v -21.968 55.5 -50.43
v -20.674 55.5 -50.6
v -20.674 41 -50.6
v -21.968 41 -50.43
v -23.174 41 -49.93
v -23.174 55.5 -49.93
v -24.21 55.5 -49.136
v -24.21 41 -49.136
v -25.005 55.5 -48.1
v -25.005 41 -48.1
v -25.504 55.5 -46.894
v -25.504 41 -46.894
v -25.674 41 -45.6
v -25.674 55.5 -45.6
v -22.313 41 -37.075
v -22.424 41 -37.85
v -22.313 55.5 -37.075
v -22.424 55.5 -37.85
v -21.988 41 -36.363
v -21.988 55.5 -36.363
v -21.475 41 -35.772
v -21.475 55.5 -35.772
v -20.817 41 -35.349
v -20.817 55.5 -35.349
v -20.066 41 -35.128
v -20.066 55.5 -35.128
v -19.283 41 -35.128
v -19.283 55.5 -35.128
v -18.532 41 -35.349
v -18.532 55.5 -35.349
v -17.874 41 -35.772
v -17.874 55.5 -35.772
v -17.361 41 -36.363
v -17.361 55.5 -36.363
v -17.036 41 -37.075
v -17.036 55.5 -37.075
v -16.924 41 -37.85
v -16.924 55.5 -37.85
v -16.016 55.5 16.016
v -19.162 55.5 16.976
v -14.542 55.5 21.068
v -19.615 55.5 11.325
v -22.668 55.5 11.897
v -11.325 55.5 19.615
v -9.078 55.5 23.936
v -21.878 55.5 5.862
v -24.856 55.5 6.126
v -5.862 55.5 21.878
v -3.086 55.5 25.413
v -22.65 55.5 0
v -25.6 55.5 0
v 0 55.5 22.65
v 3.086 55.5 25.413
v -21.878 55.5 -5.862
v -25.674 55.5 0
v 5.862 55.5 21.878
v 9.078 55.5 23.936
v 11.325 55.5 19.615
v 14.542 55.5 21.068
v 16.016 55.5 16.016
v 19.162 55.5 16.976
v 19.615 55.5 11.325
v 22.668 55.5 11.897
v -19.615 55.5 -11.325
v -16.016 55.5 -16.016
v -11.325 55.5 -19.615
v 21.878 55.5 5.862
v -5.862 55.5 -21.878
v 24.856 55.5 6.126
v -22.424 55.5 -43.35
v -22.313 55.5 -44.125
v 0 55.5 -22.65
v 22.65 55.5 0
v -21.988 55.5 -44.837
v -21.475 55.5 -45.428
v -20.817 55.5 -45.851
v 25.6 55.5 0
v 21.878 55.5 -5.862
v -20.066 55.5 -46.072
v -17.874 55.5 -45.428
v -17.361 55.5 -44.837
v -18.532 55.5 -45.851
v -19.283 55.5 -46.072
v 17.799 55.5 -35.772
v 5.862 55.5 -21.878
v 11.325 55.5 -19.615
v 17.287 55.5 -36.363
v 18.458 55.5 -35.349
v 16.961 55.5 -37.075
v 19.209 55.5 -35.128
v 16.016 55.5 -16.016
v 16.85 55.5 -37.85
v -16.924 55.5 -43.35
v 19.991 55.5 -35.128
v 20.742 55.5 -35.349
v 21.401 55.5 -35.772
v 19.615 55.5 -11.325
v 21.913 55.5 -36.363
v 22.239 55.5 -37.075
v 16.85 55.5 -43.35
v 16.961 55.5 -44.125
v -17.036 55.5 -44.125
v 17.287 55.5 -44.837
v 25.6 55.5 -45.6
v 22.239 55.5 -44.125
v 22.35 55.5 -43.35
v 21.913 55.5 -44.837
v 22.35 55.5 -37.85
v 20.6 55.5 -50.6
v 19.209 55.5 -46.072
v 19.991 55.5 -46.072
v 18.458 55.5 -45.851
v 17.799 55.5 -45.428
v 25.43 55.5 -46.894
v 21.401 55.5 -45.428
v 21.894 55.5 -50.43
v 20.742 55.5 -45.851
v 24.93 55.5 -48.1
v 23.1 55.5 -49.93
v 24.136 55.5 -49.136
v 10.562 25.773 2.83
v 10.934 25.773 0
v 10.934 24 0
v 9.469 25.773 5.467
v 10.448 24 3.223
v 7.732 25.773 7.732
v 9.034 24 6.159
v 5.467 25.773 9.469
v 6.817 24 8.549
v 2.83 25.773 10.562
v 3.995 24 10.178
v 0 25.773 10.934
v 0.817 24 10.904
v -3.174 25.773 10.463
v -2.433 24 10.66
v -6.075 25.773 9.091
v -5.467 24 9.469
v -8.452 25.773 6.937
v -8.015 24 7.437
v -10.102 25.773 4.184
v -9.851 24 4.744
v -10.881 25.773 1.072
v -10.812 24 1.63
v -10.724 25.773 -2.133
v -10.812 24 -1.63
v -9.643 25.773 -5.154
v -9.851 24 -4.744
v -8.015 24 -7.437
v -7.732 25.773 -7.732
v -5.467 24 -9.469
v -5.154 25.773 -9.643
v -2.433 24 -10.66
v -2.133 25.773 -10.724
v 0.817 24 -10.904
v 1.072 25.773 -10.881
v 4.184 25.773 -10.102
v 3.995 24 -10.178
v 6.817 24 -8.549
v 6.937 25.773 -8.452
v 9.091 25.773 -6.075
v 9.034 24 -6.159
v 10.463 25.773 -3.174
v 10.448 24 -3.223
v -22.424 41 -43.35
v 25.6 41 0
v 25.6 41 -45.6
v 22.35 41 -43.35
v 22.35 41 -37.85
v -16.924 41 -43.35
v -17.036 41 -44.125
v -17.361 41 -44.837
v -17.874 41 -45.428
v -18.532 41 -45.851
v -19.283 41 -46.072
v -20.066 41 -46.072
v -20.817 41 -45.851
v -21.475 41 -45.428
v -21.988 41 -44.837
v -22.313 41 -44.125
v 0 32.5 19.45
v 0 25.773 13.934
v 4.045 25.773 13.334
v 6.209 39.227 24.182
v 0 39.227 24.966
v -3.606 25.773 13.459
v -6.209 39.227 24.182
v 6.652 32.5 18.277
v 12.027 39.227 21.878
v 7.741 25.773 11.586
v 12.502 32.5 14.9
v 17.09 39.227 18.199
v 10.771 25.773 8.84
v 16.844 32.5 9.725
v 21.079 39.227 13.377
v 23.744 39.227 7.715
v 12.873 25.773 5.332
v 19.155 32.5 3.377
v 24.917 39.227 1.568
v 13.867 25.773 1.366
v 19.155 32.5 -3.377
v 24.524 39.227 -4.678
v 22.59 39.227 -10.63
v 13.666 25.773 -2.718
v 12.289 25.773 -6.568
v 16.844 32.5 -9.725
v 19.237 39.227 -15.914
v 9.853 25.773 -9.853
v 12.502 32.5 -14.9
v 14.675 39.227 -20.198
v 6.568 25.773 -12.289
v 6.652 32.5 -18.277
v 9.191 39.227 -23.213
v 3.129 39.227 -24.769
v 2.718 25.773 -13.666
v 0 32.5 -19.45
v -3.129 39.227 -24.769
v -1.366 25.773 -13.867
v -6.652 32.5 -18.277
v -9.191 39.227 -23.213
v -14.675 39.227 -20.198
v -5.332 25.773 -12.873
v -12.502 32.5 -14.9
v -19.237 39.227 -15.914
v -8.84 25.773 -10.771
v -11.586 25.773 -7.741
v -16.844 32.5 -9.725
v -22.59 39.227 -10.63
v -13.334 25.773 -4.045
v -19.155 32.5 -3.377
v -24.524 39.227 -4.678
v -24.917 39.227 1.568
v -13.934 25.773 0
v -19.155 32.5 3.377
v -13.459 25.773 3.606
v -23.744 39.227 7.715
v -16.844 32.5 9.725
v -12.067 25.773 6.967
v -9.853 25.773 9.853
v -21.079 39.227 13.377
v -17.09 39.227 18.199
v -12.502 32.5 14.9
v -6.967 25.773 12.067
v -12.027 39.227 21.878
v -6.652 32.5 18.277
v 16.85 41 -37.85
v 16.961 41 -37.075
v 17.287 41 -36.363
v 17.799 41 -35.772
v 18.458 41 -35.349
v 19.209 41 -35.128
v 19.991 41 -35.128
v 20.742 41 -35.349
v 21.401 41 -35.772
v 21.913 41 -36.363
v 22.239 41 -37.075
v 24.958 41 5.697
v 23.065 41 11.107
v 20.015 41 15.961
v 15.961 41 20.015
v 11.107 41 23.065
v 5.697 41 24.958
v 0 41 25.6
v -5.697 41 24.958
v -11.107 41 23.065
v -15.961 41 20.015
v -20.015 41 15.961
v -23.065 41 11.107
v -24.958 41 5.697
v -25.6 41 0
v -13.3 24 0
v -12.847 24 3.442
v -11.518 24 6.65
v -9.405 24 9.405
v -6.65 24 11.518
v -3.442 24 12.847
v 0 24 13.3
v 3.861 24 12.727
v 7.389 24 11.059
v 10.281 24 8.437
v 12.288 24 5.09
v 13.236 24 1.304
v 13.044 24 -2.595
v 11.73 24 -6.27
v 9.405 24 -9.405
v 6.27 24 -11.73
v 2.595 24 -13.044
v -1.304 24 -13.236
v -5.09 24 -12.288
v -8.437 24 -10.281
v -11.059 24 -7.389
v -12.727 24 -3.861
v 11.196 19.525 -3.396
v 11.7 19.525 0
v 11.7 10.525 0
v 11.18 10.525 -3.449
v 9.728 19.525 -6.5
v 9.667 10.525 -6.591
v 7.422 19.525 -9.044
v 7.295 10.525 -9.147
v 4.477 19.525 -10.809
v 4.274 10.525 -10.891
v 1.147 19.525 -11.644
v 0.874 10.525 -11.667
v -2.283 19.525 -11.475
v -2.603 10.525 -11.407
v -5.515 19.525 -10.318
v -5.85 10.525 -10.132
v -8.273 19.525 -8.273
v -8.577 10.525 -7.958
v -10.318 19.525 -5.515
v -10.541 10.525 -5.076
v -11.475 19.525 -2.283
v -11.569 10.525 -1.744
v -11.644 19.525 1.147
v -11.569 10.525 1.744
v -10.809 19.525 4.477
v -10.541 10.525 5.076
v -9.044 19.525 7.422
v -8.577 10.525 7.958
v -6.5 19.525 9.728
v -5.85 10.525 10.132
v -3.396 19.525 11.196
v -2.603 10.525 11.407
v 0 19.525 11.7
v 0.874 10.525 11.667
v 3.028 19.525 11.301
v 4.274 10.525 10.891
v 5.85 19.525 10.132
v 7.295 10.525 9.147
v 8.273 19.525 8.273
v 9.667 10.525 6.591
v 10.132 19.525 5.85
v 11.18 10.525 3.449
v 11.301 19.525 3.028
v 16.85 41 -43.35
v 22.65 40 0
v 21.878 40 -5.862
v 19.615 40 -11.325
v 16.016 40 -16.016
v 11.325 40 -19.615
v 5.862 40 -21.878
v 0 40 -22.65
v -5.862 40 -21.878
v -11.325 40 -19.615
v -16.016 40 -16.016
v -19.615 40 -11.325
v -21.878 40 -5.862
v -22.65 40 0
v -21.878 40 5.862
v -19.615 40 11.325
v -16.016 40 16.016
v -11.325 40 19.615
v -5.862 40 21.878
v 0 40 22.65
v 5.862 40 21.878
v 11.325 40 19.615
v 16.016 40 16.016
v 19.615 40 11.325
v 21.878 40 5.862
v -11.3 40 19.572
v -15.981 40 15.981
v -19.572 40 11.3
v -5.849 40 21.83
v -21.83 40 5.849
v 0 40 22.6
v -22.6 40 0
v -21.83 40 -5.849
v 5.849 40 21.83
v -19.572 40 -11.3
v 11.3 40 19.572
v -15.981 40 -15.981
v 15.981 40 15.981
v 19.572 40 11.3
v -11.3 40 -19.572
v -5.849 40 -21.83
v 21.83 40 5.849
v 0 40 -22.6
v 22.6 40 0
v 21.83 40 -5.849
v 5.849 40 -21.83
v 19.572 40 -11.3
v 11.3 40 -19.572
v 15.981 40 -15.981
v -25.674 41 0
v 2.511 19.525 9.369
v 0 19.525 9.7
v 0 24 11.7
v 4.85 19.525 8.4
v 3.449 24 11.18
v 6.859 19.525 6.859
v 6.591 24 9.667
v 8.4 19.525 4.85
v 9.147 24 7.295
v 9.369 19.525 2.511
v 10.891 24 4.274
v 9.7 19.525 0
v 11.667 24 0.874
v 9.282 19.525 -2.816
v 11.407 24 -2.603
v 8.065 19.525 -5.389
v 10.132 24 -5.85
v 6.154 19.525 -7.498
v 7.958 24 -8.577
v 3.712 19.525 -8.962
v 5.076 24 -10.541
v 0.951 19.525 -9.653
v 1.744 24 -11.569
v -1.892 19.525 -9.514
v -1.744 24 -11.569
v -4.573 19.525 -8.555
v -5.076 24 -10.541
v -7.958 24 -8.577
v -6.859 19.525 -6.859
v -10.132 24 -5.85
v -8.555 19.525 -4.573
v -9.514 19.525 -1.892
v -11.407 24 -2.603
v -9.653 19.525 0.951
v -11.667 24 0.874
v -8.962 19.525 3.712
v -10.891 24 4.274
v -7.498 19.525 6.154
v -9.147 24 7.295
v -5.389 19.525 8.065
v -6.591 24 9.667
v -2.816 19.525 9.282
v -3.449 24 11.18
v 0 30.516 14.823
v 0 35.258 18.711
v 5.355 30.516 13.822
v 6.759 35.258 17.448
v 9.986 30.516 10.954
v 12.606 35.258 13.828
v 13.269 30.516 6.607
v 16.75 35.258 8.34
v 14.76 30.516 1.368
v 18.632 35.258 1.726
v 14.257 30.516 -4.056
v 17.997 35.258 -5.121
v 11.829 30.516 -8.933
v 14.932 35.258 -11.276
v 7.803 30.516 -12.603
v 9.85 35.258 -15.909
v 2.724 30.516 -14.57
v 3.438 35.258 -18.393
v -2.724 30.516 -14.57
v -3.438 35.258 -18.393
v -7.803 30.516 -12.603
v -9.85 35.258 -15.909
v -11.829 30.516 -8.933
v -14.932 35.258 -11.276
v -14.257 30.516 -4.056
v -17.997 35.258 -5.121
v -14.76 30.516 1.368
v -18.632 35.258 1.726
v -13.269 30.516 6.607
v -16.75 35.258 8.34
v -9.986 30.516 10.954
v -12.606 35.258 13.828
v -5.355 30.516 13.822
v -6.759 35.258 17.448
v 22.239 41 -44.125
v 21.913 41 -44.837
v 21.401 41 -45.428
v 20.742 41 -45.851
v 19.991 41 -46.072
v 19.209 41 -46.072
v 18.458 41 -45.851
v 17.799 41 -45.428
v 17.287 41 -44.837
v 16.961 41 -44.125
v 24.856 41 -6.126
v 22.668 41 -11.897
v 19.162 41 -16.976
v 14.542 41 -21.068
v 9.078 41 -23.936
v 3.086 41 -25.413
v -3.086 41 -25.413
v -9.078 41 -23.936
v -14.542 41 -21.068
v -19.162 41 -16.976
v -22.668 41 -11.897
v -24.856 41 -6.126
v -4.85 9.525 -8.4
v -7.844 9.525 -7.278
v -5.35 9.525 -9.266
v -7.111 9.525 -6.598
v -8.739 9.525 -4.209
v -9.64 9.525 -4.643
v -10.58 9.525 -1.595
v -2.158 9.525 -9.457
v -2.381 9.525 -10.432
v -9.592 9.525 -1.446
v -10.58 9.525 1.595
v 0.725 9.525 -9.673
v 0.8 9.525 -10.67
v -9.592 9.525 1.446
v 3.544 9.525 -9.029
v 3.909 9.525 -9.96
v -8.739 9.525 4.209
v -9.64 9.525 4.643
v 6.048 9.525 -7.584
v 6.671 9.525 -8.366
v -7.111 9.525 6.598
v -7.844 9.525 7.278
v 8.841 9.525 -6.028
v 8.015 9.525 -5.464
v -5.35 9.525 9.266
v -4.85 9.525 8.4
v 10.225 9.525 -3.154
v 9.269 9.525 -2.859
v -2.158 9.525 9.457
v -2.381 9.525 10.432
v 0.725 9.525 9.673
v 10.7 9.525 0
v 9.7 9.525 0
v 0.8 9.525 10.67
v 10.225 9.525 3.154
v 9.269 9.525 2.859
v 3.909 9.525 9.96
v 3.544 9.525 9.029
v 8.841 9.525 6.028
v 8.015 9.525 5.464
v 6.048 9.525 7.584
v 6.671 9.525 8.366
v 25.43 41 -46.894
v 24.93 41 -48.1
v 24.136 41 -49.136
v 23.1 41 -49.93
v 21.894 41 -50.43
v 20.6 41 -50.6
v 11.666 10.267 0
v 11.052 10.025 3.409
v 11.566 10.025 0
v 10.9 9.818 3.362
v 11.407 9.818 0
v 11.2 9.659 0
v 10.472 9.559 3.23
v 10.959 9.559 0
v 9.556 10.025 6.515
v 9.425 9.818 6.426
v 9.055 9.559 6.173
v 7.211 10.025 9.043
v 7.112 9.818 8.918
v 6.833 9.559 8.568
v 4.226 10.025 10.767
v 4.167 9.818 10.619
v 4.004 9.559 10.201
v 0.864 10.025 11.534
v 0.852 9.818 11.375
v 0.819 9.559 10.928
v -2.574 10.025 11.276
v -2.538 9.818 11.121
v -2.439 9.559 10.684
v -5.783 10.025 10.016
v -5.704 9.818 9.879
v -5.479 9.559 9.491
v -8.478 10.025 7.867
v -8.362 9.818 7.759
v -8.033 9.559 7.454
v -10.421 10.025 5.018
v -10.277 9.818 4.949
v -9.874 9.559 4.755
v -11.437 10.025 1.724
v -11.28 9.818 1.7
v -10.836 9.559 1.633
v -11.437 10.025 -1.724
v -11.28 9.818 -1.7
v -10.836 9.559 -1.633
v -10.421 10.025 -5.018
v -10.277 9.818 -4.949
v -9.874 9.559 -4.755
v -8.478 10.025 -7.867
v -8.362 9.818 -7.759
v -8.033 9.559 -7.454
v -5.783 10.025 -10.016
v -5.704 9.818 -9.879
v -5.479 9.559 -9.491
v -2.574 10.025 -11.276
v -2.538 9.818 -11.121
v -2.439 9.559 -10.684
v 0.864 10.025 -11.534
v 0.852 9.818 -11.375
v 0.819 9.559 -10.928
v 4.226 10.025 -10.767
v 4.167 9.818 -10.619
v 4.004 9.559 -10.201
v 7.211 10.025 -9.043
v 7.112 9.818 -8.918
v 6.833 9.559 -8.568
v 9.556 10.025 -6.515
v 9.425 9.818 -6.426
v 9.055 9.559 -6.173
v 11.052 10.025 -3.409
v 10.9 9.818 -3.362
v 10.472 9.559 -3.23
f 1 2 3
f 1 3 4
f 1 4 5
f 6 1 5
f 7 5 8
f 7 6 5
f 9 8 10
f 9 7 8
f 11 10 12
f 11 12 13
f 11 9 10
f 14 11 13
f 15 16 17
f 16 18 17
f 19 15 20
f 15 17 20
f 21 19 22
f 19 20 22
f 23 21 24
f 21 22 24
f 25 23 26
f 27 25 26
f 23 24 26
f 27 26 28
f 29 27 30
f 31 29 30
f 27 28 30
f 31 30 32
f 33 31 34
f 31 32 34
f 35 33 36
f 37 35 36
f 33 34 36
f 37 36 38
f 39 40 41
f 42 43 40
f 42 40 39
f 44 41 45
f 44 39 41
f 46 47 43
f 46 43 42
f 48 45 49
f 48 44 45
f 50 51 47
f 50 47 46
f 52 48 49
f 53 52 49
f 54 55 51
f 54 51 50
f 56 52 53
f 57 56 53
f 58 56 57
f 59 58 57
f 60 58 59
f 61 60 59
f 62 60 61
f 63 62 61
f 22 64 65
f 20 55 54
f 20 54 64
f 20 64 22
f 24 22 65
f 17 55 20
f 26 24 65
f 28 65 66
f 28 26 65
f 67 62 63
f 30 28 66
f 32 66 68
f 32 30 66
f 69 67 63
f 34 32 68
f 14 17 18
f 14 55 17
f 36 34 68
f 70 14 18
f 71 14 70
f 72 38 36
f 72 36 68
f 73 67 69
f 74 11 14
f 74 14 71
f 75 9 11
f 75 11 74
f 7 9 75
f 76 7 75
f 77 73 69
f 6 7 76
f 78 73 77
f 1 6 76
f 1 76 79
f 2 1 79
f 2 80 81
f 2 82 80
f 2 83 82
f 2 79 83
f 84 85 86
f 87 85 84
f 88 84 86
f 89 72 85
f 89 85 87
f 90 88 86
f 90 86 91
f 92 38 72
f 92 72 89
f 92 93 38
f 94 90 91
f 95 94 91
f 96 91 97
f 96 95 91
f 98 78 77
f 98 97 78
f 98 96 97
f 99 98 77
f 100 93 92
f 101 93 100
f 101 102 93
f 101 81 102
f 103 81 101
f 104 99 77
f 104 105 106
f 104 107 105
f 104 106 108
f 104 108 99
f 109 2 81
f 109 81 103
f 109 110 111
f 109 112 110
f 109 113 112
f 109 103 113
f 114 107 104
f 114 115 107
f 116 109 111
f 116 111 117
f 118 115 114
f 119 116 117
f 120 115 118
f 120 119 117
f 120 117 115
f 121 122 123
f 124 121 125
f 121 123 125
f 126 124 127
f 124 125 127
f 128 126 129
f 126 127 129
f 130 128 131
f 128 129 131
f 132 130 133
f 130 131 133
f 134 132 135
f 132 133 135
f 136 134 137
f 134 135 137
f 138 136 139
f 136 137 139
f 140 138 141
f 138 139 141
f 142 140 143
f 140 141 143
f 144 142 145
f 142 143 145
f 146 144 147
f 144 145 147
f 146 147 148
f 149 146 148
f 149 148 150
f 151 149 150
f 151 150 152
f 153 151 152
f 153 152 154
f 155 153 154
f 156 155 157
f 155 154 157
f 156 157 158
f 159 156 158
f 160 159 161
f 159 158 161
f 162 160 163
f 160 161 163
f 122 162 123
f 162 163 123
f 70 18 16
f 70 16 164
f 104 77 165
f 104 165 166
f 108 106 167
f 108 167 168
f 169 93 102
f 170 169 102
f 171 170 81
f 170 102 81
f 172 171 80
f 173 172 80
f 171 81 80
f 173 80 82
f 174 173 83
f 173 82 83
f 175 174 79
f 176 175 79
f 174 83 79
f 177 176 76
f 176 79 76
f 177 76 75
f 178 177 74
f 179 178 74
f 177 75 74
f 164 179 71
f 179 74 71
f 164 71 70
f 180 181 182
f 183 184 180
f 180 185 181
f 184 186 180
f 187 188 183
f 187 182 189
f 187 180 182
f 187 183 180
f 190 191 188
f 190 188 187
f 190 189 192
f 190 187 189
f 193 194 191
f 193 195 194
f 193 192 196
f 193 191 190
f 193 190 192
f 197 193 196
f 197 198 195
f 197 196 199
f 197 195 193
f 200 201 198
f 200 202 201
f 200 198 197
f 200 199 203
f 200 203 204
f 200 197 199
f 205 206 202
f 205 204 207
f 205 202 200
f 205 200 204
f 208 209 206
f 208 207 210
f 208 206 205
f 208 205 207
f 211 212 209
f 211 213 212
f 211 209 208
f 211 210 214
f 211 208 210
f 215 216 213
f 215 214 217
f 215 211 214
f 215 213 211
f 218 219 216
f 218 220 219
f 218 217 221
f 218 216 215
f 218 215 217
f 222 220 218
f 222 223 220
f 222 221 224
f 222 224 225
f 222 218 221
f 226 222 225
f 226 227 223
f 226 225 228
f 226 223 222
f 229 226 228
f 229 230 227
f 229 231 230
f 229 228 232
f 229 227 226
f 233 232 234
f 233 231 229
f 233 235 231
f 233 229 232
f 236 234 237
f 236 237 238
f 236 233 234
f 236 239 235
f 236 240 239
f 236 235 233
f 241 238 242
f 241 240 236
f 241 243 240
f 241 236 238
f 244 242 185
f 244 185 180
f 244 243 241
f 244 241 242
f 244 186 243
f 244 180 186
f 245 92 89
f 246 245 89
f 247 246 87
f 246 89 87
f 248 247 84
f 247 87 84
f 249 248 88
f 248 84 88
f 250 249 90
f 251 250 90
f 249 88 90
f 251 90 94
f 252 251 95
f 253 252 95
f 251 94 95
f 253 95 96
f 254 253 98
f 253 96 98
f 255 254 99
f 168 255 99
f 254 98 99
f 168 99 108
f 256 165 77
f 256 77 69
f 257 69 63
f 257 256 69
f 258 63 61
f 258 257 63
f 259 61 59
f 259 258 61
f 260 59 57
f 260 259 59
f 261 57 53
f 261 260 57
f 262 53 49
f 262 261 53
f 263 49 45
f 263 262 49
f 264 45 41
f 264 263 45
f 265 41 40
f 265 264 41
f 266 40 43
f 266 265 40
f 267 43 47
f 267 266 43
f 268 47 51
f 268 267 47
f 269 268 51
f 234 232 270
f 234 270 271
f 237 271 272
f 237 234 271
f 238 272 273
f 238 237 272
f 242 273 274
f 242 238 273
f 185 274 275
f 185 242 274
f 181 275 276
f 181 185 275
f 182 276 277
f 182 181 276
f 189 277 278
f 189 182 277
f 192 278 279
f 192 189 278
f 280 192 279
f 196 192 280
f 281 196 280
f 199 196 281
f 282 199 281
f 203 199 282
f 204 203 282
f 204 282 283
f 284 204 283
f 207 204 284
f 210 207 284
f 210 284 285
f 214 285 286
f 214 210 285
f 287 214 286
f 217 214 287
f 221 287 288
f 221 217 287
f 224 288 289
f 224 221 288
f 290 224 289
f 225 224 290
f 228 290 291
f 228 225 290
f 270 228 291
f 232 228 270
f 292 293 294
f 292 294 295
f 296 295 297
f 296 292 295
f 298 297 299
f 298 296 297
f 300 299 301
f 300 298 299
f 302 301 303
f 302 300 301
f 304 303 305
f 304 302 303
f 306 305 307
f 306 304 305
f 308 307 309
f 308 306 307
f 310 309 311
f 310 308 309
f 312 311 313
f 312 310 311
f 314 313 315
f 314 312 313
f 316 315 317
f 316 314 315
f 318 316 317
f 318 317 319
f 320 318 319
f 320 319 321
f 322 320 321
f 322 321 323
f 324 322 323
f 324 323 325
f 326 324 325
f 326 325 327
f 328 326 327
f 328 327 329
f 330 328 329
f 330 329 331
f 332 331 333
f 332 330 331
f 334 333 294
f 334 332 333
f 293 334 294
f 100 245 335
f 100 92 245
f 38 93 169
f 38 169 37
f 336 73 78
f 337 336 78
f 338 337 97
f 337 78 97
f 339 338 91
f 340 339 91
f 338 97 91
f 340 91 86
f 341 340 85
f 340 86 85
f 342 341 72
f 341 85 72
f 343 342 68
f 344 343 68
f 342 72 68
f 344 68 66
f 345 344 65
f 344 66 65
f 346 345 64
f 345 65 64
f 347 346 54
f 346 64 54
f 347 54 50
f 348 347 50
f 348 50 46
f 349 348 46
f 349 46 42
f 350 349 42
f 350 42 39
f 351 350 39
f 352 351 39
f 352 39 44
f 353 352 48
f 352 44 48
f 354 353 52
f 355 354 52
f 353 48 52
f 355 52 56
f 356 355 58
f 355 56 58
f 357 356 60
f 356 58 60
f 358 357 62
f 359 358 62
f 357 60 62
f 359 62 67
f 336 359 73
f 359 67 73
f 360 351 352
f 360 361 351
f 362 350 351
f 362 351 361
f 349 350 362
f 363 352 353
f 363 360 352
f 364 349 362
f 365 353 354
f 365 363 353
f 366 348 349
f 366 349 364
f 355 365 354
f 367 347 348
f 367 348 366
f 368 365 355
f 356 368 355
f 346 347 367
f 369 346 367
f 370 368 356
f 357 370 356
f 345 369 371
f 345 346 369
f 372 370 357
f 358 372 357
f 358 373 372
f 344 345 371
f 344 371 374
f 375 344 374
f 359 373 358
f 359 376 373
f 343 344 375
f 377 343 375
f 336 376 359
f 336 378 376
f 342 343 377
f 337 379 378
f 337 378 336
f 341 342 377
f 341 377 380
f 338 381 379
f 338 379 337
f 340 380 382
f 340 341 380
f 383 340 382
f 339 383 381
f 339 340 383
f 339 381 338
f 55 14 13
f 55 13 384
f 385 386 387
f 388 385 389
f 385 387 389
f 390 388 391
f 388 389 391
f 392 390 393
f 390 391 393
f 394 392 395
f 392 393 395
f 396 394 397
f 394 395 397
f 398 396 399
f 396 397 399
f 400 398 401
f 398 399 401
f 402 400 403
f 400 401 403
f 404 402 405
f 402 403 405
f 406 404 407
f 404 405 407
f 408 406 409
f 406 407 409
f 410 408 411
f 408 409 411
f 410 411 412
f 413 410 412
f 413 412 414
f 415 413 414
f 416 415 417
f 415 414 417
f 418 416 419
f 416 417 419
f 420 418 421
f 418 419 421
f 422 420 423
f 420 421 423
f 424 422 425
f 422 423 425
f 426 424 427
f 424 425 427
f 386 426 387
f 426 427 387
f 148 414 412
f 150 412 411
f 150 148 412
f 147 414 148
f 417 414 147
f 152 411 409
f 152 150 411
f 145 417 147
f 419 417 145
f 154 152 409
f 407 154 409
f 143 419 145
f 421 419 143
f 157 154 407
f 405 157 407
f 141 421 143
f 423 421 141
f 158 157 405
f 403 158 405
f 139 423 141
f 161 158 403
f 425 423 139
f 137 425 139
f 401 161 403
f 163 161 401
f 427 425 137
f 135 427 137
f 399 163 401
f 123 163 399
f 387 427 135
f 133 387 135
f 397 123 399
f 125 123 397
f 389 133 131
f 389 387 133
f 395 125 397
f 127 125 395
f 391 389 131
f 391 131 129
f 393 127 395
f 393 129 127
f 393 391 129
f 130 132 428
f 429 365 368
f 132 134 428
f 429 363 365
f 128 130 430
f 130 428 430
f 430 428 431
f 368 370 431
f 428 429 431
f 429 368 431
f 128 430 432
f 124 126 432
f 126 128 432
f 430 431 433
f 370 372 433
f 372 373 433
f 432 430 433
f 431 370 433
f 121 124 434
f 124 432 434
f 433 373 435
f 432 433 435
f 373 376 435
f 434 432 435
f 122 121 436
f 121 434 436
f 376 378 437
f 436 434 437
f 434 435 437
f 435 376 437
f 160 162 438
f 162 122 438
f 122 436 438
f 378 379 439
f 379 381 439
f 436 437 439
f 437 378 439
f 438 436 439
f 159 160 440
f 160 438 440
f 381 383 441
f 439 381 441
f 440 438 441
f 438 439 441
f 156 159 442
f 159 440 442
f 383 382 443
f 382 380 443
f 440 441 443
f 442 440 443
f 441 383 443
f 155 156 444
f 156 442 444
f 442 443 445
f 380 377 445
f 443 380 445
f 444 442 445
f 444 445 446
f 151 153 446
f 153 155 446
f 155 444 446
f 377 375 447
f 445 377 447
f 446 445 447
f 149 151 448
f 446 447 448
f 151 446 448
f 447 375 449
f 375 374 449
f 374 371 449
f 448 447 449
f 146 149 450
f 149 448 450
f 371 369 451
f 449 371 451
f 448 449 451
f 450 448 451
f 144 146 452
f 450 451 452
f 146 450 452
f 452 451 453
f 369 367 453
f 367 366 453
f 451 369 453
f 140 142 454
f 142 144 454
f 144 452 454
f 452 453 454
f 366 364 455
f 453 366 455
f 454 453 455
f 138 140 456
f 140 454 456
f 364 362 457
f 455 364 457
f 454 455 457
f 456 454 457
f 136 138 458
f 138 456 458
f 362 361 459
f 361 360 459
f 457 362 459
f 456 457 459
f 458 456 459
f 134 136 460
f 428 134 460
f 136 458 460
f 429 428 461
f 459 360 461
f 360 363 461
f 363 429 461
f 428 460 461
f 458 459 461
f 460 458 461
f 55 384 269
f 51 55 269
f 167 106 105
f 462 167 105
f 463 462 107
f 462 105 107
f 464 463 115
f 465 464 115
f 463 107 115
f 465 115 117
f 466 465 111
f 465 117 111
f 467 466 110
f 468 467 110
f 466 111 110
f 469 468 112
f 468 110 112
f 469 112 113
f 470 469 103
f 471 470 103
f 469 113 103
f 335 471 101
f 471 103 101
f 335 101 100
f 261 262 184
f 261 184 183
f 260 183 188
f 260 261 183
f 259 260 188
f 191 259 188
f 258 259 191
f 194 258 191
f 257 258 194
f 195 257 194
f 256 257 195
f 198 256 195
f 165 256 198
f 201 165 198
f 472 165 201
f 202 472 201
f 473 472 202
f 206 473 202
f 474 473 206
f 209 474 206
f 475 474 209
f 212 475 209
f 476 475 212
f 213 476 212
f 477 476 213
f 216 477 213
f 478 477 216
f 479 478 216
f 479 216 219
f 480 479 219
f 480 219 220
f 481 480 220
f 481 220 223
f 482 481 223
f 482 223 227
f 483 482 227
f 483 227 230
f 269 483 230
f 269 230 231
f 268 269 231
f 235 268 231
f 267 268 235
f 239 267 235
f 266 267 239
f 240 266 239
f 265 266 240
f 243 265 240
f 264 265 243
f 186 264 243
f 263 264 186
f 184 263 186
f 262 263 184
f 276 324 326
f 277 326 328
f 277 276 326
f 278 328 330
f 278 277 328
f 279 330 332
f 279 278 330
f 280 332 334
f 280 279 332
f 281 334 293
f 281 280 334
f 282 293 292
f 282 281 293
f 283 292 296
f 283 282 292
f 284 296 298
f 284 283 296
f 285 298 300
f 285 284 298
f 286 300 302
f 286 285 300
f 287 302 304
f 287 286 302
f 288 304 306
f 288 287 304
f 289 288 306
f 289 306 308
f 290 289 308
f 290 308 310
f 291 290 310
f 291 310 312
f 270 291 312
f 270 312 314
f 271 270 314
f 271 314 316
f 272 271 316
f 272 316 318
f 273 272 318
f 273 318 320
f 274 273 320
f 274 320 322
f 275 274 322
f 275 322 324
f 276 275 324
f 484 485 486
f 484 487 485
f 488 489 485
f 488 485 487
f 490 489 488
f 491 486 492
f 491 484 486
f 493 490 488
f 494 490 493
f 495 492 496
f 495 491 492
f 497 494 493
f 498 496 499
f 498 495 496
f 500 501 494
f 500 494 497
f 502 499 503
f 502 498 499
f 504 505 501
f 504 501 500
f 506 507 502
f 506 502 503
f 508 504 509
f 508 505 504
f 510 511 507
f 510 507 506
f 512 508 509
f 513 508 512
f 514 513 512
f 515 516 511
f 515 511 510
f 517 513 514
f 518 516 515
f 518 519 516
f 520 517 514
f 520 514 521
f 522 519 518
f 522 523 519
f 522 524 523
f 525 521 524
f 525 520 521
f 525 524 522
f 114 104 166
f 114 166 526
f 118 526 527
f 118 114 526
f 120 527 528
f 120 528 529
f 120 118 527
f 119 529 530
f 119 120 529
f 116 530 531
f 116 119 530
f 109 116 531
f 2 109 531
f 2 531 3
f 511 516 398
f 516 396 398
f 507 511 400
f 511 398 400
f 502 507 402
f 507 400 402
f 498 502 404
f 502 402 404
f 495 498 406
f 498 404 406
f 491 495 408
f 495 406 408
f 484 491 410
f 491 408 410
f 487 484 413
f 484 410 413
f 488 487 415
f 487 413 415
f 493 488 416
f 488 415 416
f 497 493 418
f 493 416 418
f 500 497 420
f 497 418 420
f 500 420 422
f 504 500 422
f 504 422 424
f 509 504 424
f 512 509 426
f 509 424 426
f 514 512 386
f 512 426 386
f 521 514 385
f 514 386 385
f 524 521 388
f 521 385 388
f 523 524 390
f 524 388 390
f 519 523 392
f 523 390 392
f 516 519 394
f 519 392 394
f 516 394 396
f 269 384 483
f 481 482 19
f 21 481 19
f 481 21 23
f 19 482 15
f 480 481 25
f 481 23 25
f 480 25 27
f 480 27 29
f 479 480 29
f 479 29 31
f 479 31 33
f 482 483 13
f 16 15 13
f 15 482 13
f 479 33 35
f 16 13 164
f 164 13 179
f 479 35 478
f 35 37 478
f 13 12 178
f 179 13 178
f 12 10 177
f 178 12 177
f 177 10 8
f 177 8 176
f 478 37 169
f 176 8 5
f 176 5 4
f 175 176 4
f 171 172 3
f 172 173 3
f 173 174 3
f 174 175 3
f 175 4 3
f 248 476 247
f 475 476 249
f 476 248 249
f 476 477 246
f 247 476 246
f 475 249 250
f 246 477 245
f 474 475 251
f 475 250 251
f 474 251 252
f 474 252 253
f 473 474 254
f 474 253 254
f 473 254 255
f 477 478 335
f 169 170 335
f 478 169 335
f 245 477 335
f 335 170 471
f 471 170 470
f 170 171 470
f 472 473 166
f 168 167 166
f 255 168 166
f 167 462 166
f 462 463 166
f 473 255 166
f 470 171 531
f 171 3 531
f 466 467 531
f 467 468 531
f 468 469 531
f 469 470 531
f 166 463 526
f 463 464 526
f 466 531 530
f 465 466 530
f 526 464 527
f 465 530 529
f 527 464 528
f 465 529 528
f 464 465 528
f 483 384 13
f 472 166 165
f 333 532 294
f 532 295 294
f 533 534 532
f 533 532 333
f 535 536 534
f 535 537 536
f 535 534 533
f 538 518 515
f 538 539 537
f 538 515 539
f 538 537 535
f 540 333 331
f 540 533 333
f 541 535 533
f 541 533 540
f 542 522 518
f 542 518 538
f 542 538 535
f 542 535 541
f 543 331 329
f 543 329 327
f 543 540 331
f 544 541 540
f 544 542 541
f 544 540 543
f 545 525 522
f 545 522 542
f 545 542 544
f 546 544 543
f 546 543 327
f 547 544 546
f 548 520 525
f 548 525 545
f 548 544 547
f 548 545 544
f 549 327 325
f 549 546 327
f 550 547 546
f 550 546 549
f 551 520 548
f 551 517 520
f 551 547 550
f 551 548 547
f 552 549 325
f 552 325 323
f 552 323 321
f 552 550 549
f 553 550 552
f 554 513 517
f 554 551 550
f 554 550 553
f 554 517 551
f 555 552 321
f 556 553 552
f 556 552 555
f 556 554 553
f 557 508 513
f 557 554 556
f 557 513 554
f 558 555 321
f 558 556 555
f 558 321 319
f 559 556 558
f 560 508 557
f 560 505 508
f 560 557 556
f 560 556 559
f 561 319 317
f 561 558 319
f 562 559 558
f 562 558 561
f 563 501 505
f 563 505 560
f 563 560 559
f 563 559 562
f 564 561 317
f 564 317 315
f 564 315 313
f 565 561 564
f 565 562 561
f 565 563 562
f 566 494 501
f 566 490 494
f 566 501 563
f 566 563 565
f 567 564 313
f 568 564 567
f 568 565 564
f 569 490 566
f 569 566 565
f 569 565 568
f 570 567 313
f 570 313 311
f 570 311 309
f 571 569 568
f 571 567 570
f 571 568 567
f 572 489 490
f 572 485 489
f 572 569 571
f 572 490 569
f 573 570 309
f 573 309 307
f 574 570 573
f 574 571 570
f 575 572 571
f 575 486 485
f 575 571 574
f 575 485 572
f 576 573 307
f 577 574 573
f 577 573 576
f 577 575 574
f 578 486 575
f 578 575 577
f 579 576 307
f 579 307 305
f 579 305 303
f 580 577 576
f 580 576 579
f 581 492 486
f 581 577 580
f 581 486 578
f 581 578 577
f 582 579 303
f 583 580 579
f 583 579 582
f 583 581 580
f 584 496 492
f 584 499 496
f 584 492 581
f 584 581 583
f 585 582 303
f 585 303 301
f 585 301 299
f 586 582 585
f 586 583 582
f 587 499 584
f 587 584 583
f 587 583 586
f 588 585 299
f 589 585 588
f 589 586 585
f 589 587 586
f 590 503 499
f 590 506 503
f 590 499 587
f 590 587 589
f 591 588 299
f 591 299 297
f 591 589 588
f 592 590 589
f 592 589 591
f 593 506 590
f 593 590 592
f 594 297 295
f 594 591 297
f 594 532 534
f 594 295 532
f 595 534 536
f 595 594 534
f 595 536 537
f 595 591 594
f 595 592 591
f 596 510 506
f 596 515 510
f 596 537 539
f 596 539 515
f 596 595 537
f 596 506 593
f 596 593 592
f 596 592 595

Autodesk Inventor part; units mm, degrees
ref_plane "YZ Plane" through (0, 0, 0) normal (1, 0, 0) x (0, 1, 0)
ref_plane "XZ Plane" through (0, 0, 0) normal (0, 1, 0) x (-1, 0, 0)
sketch "Sketch1" plane through (0, 0, 0) normal (0, 1, 0) x (-1, 0, 0)
  circle A0 centre (0, 0) radius 10.3
  circle A1 centre (0, 0) radius 13.3
  dimension "d0" = 20.6
  dimension "d1" = 3
extrude "Extrusion1" add sketch "Sketch1" along normal blind 25
sketch "Sketch2" plane through (0, 0, 0) normal (0, 0, 1) x (1, 0, 0)
  circle A0 centre (0, 4) radius 16
  line L0 (13.3, 25) -> (-13.3, 25) projected
  line L1 (0, 25) -> (0, 20)
  point P0 (0, 0)
  dimension "d4" = 32
  dimension "d5" = 5
extrude "Extrusion2" cut sketch "Sketch2" against normal through all both and the other way through all
sketch "Sketch4" plane through (0, 0, 0) normal (1, 0, 0) x (0, 1, 0)
  line L0 (20, 13.3) -> (25, 13.3) projected
  line L1 (25, 13.3) -> (40, 25.6)
  line L2 (40, 25.6) -> (55, 25.6)
  line L3 (55, 25.6) -> (55, 22.6)
  line L4 (55, 22.6) -> (40, 22.6)
  line L5 (25, 10.3) -> (25, -10.3) projected
  line L6 (40, 22.6) -> (25, 10.3)
  line L7 (0, 0) -> (85.2959, 0)
  line L8 (25, 13.3) -> (25, 10.3)
  line L9 (25, -13.3) -> (25, 13.3) projected
  point P0 (25, 0)
  dimension "d8" = 22.6
  dimension "d9" = 3
  dimension "d11" = 15
  dimension "d12" = 30
revolve "Revolution1" add sketch "Sketch4" angle 360 about axis through (0, 0, 0) along (0, 1, 0)
chamfer "Chamfer1" distance 1 angle 45 5 edges at (0, 40, -25.6) (0, 55, -22.6) (10.3, 16.2438, -0.0012) (9.4045, 25, -9.4045) (-9.4045, 25, 9.4045)
sketch "Sketch5" plane through (0, 0, 0) normal (0, 1, 0) x (-1, 0, 0)
  circle A0 centre (0, 0) radius 13.9341 projected
  circle A1 centre (0, 0) radius 35.7982
  point P0 (0, 0)
extrude "Extrusion3" cut sketch "Sketch5" along normal blind 24 contours A0 | A1
sketch "Sketch6" plane through (0, 24, 0) normal (0, -1, 0) x (1, 0, 0)
  circle A0 centre (0, 0) radius 10.3
  circle A1 centre (0, 0) radius 13.3
extrude "Extrusion4" add sketch "Sketch6" along normal blind 10
sketch "Sketch7" plane through (0, 14, 0) normal (0, -1, 0) x (1, 0, 0)
  circle A0 centre (0, 0) radius 6.75
  circle A1 centre (0, 0) radius 13.3 projected
  circle A2 centre (0, 0) radius 10.3 projected
  dimension "d21" = 13.5
extrude "Extrusion5" add sketch "Sketch7" against normal blind 11 contours A1 | A2
fillet "Fillet1" radius 2 1 edges at (-6.75, 14, 0)
sketch "Sketch8" plane through (0, 55, 0) normal (0, 1, 0) x (1, 0, 0)
  circle A0 centre (0, 0) radius 22.8
  dimension "d28" = 45.6
extrude "Extrusion6" cut sketch "Sketch8" against normal blind 15
sketch "Sketch10" plane through (0, 55, 0) normal (0, 1, 0) x (1, 0, 0)
  line L0 (-37.6, 25.6) -> (37.6, 25.6)
  line L1 (37.6, 25.6) -> (37.6, 0)
  line L2 (37.6, 0) -> (-37.6, 0)
  line L3 (-37.6, 0) -> (-37.6, 25.6)
  circle A0 centre (0, 0) radius 25.6 projected
  circle A1 centre (0, 0) radius 25.6 projected
  point P0 (-25.6, 0)
  point P1 (25.6, 0)
  point P2 (0, 25.6)
  point P3 (25.6, 0)
  dimension "d34" = 12
  dimension "d35" = 12
extrude "Extrusion8" add sketch "Sketch10" against normal blind 14 contours L0 A0 L2 L3 | L0 L1 L2 A0
sketch "Sketch11" plane through (-37.6, 55, -25.6) normal (0, 1, 0) x (1, 0, 0)
  line L0 (0, -25.6) -> (12, -25.6) projected
  line L1 (75.2, 0) -> (0, 0) projected
  line L2 (12, -25.6) -> (0, 0)
  line L3 (0, 0) -> (0, -25.6)
  arc A0 (12, -25.6) -> (63.2, -25.6) centre (37.6, -25.6) ccw projected
  line L4 (12, -25.6) -> (0, -25.6)
  arc A1 (63.2, -25.6) -> (37.6, 0) centre (37.6, -25.6) ccw projected
  line L5 (63.2, -25.6) -> (75.2, 0)
  line L6 (63.2, -25.6) -> (75.2, -25.6) projected
  line L7 (63.2, -25.6) -> (75.2, -25.6)
  line L8 (75.2, 0) -> (75.2, -25.6) projected
  line L9 (75.2, -25.6) -> (75.2, 0)
extrude "Extrusion9" [suppressed]
sketch "Sketch12" plane through (0, 0, 0) normal (0, 0, 1) x (1, 0, 0)
  circle A0 centre (-31.1, 48) radius 4.75
  circle A1 centre (31.1, 48) radius 4.75
  line L0 (-37.6, 55) -> (-37.6, 41) projected
  line L1 (37.6, 55) -> (37.6, 41) projected
  line L2 (37.6, 41) -> (25.6, 41) projected
  point P0 (0, 0)
  dimension "d40" = 9.5
  dimension "d41" = 6.5
  dimension "d42" = 6.5
  dimension "d43" = 7
extrude "Extrusion10" [suppressed]
sketch "Sketch13" plane through (0, 0, -21.6) normal (0, 0, 1) x (1, 0, 0)
  arc A0 (-35.725, 46.9175) -> (-35.725, 49.0825) centre (-31.1, 48) ccw projected
  circle A1 centre (-31.1, 48) radius 2.75
  arc A2 (35.725, 49.0825) -> (35.725, 46.9175) centre (31.1, 48) ccw projected
  circle A3 centre (31.1, 48) radius 2.75
  point P0 (0, 0)
  dimension "d46" = 5.5
extrude "Extrusion11" [suppressed]
sketch "Sketch17" plane through (0, 14, 0) normal (0, -1, 0) x (1, 0, 0)
  circle A0 centre (0, 0) radius 10.9341
  circle A1 centre (0, 0) radius 13.9341 projected
  dimension "d53" = 3
extrude "Extrusion12" cut sketch "Sketch17" against normal through all contours A0
sketch "Sketch18" plane through (0, 14, 0) normal (0, -1, 0) x (1, 0, 0)
  circle A0 centre (0, 0) radius 20.3
  circle A1 centre (0, 0) radius 13.3 projected
  dimension "d56" = 7
extrude "Extrusion13" add sketch "Sketch18" against normal blind 3
chamfer "Chamfer3" distance 7 angle 45 1 edges at (-13.3, 17, 0)
ref_plane "Work Plane1" through (-37.6, 24, -25.6) normal (0, 1, 0) x (1, 0, 0)
sketch "Sketch20" plane through (-37.6, 24, -25.6) normal (0, 1, 0) x (1, 0, 0)
  circle A0 centre (20.6, -25.6) radius 3
  line L0 (20.6, -29.0641) -> (17.6, -27.3321)
  line L1 (17.6, -27.3321) -> (17.6, -23.8679)
  line L2 (17.6, -23.8679) -> (20.6, -22.1359)
  line L3 (20.6, -22.1359) -> (23.6, -23.8679)
  line L4 (23.6, -23.8679) -> (23.6, -27.3321)
  line L5 (23.6, -27.3321) -> (20.6, -29.0641)
  point P0 (37.6, -25.6)
  dimension "d64" = 6
  dimension "d65" = 17
extrude "Extrusion14" cut sketch "Sketch20" against normal blind 7
sketch "Sketch21" plane through (0, 14, 0) normal (0, -1, 0) x (1, 0, 0)
  circle A0 centre (-17, 0) radius 1.75
  point P0 (0, 0)
  dimension "d68" = 3.5
  dimension "d69" = 17
extrude "Extrusion15" cut sketch "Sketch21" against normal blind 10
pattern_circular "Circular Pattern1" count 6 over 360 about axis through (0, 47.5, 0) along (0, 1, 0) of "Extrusion15", "Extrusion14"
sketch "Sketch23" plane through (-37.6, 55, -25.6) normal (0, 1, 0) x (1, 0, 0)
  line L0 (75.2, 0) -> (0, 0) projected
  arc A0 (12, -25.6) -> (63.2, -25.6) centre (37.6, -25.6) ccw projected
  circle A1 centre (37.6, -25.6) radius 23.6 projected
  circle A2 centre (37.6, -25.6) radius 22.8 projected
  line L1 (63.2, -25.6) -> (75.2, -25.6) projected
  line L2 (75.2, -25.6) -> (75.2, 0) projected
  line L3 (0, 0) -> (0, -25.6) projected
  line L4 (0, -25.6) -> (12, -25.6) projected
sketch "Sketch24" plane through (-37.6, 55, -25.6) normal (0, 1, 0) x (1, 0, 0)
  circle A0 centre (37.6, -25.6) radius 23.6
  circle A1 centre (37.6, -25.6) radius 23.6 projected
  circle A2 centre (37.6, -25.6) radius 22.8
  circle A3 centre (37.6, -25.6) radius 22.8 projected
extrude "Extrusion16" add sketch "Sketch24" against normal blind 2
sketch "Sketch25" plane through (-37.6, 55, -25.6) normal (0, 1, 0) x (1, 0, 0)
  circle A0 centre (37.6, -25.6) radius 22.8 projected
  line L0 (75.2, 0) -> (0, 0) projected
  arc A1 (12, -25.6) -> (63.2, -25.6) centre (37.6, -25.6) ccw projected
  line L1 (63.2, -25.6) -> (75.2, -25.6) projected
  line L2 (75.2, -25.6) -> (75.2, 0) projected
  line L3 (0, 0) -> (0, -25.6) projected
  line L4 (0, -25.6) -> (12, -25.6) projected
extrude "Extrusion17" add sketch "Sketch25" along normal blind 3
sketch "Sketch26" plane through (-37.6, 58, -25.6) normal (0, 1, 0) x (1, 0, 0)
  line L0 (11.9256, -25.6) -> (63.2, -25.6)
  line L1 (63.2, -25.6) -> (63.2, 25)
  line L2 (63.2, 25) -> (11.9256, 25)
  line L3 (11.9256, 25) -> (11.9256, -25.6)
  line L4 (75.2, 0) -> (0, 0) projected
  circle A0 centre (17.9256, 15) radius 2.75
  circle A1 centre (57.2, 15) radius 2.75
  line L5 (37.6, 0) -> (75.2, 0) projected
  line L6 (63.2, 0) -> (11.9256, 0)
  line L7 (0, 0) -> (37.6, 0) projected
  point P0 (37.6, -25.6)
  point P1 (11.9256, 0)
  point P2 (63.2, 0)
  dimension "d79" = 25
  dimension "d80" = 5.5
  dimension "d81" = 6
  dimension "d82" = 6
  dimension "d91" = 15
extrude "Extrusion18" add sketch "Sketch26" against normal up to surface (17 mm away) contours L3 L2 L1 L4
sketch "Sketch27" plane through (-37.6, 58, -25.6) normal (0, 1, 0) x (1, 0, 0)
  line L0 (11.9256, 25) -> (11.9256, 0) projected
  line L1 (-19.2052, -40.8404) -> (11.9256, -40.8404)
  line L2 (11.9256, -40.8404) -> (11.9256, 11.2059)
  line L3 (11.9256, 11.2059) -> (-19.2052, 11.2059)
  line L4 (-19.2052, 11.2059) -> (-19.2052, -40.8404)
  line L5 (63.2, 0) -> (63.2, 25) projected
  line L6 (63.2, 17.9527) -> (82.2369, 17.9527)
  line L7 (82.2369, 17.9527) -> (82.2369, -35.178)
  line L8 (82.2369, -35.178) -> (63.2, -35.178)
  line L9 (63.2, -35.178) -> (63.2, 17.9527)
  point P0 (37.6, -25.6)
extrude "Extrusion19" cut sketch "Sketch27" against normal through all
sketch "Sketch28" plane through (-37.6, 58, -25.6) normal (0, 1, 0) x (1, 0, 0)
  line L0 (20.6756, 12.25) -> (15.1756, 12.25)
  line L1 (15.1756, 12.25) -> (15.1756, 17.75)
  line L2 (15.1756, 17.75) -> (20.6756, 17.75)
  line L3 (20.6756, 17.75) -> (20.6756, 12.25)
  circle A0 centre (17.9256, 15) radius 2.75 projected
  line L4 (20.6756, 12.25) -> (15.1756, 17.75) construction
  line L5 (15.1756, 12.25) -> (20.6756, 17.75) construction
  line L6 (59.95, 12.25) -> (54.45, 12.25)
  line L7 (54.45, 12.25) -> (54.45, 17.75)
  line L8 (54.45, 17.75) -> (59.95, 17.75)
  line L9 (59.95, 17.75) -> (59.95, 12.25)
  circle A1 centre (57.2, 15) radius 2.75 projected
  line L10 (59.95, 12.25) -> (54.45, 17.75) construction
  line L11 (54.45, 12.25) -> (59.95, 17.75) construction
  circle A2 centre (17.9256, 12.25) radius 2.75
  circle A3 centre (17.9256, 17.75) radius 2.75
  circle A4 centre (57.2, 12.25) radius 2.75
  circle A5 centre (57.2, 17.75) radius 2.75
  point P0 (37.6, -25.6)
  point P1 (20.6756, 12.25)
  point P2 (20.6756, 17.75)
  dimension "d87" = 5.5
  dimension "d88" = 5.5
extrude "Extrusion20" cut sketch "Sketch28" against normal through all
sketch "Sketch29" plane through (0, 14, 0) normal (0, -1, 0) x (1, 0, 0)
  circle A0 centre (0, 0) radius 35.383
extrude "Extrusion21" cut sketch "Sketch29" against normal blind 10
sketch "Sketch31" plane through (0, 0, 0) normal (1, 0, 0) x (0, 1, 0)
  line L0 (24, 13.3) -> (25.7733, 13.9341) projected
  line L1 (24, 13.3) -> (19.5254, 11.7)
  line L2 (10.3519, 0) -> (30.0392, 0)
  line L3 (24, -13.3) -> (24, 13.3) projected
  line L4 (24, 11.7) -> (19.5254, 9.7)
  line L5 (19.5254, 11.7) -> (19.5254, 9.7)
  line L6 (24, 11.7) -> (24, 13.3)
  point P0 (0, 0)
  dimension "d95" = 11.7
  dimension "d96" = 2
revolve "Revolution2" add sketch "Sketch31" angle 360 about axis through (0, 10.3519, 0) along (0, 1, 0)
sketch "Sketch32" plane through (0, 19.5254, 0) normal (0, -1, 0) x (1, 0, 0)
  circle A0 centre (0, 0) radius 9.7 projected
  circle A1 centre (0, 0) radius 11.7 projected
extrude "Extrusion22" add sketch "Sketch32" along normal blind 10
sketch "Sketch33" plane through (-37.6, 58, -25.6) normal (0, 1, 0) x (1, 0, 0)
  circle A0 centre (37.6, -25.6) radius 22.65
  circle A1 centre (37.6, -25.6) radius 22.8
  circle A2 centre (37.6, -25.6) radius 22.8 projected
  dimension "d100" = 45.3
extrude "Extrusion23" add sketch "Sketch33" against normal blind 18
fillet "Fillet2" radius 5 2 edges at (25.6, 49.5, -50.6) (-25.6744, 49.5, -50.6)
fillet "Fillet3" radius 1 1 edges at (-11.7, 9.5254, 0)
sketch "Sketch34" plane through (-37.6, 58, -25.6) normal (0, 1, 0) x (1, 0, 0)
  line L0 (-0.5139, -99.2858) -> (75.7139, -99.2858)
  line L1 (75.7139, -99.2858) -> (75.7139, 48.0858)
  line L2 (75.7139, 48.0858) -> (-0.5139, 48.0858)
  line L3 (-0.5139, 48.0858) -> (-0.5139, -99.2858)
  line L4 (-0.5139, -99.2858) -> (75.7139, 48.0858) construction
  line L5 (75.7139, -99.2858) -> (-0.5139, 48.0858) construction
  point P0 (37.6, -25.6)
extrude "Extrusion24" cut sketch "Sketch34" against normal blind 2.5
properties part number "Chute"
